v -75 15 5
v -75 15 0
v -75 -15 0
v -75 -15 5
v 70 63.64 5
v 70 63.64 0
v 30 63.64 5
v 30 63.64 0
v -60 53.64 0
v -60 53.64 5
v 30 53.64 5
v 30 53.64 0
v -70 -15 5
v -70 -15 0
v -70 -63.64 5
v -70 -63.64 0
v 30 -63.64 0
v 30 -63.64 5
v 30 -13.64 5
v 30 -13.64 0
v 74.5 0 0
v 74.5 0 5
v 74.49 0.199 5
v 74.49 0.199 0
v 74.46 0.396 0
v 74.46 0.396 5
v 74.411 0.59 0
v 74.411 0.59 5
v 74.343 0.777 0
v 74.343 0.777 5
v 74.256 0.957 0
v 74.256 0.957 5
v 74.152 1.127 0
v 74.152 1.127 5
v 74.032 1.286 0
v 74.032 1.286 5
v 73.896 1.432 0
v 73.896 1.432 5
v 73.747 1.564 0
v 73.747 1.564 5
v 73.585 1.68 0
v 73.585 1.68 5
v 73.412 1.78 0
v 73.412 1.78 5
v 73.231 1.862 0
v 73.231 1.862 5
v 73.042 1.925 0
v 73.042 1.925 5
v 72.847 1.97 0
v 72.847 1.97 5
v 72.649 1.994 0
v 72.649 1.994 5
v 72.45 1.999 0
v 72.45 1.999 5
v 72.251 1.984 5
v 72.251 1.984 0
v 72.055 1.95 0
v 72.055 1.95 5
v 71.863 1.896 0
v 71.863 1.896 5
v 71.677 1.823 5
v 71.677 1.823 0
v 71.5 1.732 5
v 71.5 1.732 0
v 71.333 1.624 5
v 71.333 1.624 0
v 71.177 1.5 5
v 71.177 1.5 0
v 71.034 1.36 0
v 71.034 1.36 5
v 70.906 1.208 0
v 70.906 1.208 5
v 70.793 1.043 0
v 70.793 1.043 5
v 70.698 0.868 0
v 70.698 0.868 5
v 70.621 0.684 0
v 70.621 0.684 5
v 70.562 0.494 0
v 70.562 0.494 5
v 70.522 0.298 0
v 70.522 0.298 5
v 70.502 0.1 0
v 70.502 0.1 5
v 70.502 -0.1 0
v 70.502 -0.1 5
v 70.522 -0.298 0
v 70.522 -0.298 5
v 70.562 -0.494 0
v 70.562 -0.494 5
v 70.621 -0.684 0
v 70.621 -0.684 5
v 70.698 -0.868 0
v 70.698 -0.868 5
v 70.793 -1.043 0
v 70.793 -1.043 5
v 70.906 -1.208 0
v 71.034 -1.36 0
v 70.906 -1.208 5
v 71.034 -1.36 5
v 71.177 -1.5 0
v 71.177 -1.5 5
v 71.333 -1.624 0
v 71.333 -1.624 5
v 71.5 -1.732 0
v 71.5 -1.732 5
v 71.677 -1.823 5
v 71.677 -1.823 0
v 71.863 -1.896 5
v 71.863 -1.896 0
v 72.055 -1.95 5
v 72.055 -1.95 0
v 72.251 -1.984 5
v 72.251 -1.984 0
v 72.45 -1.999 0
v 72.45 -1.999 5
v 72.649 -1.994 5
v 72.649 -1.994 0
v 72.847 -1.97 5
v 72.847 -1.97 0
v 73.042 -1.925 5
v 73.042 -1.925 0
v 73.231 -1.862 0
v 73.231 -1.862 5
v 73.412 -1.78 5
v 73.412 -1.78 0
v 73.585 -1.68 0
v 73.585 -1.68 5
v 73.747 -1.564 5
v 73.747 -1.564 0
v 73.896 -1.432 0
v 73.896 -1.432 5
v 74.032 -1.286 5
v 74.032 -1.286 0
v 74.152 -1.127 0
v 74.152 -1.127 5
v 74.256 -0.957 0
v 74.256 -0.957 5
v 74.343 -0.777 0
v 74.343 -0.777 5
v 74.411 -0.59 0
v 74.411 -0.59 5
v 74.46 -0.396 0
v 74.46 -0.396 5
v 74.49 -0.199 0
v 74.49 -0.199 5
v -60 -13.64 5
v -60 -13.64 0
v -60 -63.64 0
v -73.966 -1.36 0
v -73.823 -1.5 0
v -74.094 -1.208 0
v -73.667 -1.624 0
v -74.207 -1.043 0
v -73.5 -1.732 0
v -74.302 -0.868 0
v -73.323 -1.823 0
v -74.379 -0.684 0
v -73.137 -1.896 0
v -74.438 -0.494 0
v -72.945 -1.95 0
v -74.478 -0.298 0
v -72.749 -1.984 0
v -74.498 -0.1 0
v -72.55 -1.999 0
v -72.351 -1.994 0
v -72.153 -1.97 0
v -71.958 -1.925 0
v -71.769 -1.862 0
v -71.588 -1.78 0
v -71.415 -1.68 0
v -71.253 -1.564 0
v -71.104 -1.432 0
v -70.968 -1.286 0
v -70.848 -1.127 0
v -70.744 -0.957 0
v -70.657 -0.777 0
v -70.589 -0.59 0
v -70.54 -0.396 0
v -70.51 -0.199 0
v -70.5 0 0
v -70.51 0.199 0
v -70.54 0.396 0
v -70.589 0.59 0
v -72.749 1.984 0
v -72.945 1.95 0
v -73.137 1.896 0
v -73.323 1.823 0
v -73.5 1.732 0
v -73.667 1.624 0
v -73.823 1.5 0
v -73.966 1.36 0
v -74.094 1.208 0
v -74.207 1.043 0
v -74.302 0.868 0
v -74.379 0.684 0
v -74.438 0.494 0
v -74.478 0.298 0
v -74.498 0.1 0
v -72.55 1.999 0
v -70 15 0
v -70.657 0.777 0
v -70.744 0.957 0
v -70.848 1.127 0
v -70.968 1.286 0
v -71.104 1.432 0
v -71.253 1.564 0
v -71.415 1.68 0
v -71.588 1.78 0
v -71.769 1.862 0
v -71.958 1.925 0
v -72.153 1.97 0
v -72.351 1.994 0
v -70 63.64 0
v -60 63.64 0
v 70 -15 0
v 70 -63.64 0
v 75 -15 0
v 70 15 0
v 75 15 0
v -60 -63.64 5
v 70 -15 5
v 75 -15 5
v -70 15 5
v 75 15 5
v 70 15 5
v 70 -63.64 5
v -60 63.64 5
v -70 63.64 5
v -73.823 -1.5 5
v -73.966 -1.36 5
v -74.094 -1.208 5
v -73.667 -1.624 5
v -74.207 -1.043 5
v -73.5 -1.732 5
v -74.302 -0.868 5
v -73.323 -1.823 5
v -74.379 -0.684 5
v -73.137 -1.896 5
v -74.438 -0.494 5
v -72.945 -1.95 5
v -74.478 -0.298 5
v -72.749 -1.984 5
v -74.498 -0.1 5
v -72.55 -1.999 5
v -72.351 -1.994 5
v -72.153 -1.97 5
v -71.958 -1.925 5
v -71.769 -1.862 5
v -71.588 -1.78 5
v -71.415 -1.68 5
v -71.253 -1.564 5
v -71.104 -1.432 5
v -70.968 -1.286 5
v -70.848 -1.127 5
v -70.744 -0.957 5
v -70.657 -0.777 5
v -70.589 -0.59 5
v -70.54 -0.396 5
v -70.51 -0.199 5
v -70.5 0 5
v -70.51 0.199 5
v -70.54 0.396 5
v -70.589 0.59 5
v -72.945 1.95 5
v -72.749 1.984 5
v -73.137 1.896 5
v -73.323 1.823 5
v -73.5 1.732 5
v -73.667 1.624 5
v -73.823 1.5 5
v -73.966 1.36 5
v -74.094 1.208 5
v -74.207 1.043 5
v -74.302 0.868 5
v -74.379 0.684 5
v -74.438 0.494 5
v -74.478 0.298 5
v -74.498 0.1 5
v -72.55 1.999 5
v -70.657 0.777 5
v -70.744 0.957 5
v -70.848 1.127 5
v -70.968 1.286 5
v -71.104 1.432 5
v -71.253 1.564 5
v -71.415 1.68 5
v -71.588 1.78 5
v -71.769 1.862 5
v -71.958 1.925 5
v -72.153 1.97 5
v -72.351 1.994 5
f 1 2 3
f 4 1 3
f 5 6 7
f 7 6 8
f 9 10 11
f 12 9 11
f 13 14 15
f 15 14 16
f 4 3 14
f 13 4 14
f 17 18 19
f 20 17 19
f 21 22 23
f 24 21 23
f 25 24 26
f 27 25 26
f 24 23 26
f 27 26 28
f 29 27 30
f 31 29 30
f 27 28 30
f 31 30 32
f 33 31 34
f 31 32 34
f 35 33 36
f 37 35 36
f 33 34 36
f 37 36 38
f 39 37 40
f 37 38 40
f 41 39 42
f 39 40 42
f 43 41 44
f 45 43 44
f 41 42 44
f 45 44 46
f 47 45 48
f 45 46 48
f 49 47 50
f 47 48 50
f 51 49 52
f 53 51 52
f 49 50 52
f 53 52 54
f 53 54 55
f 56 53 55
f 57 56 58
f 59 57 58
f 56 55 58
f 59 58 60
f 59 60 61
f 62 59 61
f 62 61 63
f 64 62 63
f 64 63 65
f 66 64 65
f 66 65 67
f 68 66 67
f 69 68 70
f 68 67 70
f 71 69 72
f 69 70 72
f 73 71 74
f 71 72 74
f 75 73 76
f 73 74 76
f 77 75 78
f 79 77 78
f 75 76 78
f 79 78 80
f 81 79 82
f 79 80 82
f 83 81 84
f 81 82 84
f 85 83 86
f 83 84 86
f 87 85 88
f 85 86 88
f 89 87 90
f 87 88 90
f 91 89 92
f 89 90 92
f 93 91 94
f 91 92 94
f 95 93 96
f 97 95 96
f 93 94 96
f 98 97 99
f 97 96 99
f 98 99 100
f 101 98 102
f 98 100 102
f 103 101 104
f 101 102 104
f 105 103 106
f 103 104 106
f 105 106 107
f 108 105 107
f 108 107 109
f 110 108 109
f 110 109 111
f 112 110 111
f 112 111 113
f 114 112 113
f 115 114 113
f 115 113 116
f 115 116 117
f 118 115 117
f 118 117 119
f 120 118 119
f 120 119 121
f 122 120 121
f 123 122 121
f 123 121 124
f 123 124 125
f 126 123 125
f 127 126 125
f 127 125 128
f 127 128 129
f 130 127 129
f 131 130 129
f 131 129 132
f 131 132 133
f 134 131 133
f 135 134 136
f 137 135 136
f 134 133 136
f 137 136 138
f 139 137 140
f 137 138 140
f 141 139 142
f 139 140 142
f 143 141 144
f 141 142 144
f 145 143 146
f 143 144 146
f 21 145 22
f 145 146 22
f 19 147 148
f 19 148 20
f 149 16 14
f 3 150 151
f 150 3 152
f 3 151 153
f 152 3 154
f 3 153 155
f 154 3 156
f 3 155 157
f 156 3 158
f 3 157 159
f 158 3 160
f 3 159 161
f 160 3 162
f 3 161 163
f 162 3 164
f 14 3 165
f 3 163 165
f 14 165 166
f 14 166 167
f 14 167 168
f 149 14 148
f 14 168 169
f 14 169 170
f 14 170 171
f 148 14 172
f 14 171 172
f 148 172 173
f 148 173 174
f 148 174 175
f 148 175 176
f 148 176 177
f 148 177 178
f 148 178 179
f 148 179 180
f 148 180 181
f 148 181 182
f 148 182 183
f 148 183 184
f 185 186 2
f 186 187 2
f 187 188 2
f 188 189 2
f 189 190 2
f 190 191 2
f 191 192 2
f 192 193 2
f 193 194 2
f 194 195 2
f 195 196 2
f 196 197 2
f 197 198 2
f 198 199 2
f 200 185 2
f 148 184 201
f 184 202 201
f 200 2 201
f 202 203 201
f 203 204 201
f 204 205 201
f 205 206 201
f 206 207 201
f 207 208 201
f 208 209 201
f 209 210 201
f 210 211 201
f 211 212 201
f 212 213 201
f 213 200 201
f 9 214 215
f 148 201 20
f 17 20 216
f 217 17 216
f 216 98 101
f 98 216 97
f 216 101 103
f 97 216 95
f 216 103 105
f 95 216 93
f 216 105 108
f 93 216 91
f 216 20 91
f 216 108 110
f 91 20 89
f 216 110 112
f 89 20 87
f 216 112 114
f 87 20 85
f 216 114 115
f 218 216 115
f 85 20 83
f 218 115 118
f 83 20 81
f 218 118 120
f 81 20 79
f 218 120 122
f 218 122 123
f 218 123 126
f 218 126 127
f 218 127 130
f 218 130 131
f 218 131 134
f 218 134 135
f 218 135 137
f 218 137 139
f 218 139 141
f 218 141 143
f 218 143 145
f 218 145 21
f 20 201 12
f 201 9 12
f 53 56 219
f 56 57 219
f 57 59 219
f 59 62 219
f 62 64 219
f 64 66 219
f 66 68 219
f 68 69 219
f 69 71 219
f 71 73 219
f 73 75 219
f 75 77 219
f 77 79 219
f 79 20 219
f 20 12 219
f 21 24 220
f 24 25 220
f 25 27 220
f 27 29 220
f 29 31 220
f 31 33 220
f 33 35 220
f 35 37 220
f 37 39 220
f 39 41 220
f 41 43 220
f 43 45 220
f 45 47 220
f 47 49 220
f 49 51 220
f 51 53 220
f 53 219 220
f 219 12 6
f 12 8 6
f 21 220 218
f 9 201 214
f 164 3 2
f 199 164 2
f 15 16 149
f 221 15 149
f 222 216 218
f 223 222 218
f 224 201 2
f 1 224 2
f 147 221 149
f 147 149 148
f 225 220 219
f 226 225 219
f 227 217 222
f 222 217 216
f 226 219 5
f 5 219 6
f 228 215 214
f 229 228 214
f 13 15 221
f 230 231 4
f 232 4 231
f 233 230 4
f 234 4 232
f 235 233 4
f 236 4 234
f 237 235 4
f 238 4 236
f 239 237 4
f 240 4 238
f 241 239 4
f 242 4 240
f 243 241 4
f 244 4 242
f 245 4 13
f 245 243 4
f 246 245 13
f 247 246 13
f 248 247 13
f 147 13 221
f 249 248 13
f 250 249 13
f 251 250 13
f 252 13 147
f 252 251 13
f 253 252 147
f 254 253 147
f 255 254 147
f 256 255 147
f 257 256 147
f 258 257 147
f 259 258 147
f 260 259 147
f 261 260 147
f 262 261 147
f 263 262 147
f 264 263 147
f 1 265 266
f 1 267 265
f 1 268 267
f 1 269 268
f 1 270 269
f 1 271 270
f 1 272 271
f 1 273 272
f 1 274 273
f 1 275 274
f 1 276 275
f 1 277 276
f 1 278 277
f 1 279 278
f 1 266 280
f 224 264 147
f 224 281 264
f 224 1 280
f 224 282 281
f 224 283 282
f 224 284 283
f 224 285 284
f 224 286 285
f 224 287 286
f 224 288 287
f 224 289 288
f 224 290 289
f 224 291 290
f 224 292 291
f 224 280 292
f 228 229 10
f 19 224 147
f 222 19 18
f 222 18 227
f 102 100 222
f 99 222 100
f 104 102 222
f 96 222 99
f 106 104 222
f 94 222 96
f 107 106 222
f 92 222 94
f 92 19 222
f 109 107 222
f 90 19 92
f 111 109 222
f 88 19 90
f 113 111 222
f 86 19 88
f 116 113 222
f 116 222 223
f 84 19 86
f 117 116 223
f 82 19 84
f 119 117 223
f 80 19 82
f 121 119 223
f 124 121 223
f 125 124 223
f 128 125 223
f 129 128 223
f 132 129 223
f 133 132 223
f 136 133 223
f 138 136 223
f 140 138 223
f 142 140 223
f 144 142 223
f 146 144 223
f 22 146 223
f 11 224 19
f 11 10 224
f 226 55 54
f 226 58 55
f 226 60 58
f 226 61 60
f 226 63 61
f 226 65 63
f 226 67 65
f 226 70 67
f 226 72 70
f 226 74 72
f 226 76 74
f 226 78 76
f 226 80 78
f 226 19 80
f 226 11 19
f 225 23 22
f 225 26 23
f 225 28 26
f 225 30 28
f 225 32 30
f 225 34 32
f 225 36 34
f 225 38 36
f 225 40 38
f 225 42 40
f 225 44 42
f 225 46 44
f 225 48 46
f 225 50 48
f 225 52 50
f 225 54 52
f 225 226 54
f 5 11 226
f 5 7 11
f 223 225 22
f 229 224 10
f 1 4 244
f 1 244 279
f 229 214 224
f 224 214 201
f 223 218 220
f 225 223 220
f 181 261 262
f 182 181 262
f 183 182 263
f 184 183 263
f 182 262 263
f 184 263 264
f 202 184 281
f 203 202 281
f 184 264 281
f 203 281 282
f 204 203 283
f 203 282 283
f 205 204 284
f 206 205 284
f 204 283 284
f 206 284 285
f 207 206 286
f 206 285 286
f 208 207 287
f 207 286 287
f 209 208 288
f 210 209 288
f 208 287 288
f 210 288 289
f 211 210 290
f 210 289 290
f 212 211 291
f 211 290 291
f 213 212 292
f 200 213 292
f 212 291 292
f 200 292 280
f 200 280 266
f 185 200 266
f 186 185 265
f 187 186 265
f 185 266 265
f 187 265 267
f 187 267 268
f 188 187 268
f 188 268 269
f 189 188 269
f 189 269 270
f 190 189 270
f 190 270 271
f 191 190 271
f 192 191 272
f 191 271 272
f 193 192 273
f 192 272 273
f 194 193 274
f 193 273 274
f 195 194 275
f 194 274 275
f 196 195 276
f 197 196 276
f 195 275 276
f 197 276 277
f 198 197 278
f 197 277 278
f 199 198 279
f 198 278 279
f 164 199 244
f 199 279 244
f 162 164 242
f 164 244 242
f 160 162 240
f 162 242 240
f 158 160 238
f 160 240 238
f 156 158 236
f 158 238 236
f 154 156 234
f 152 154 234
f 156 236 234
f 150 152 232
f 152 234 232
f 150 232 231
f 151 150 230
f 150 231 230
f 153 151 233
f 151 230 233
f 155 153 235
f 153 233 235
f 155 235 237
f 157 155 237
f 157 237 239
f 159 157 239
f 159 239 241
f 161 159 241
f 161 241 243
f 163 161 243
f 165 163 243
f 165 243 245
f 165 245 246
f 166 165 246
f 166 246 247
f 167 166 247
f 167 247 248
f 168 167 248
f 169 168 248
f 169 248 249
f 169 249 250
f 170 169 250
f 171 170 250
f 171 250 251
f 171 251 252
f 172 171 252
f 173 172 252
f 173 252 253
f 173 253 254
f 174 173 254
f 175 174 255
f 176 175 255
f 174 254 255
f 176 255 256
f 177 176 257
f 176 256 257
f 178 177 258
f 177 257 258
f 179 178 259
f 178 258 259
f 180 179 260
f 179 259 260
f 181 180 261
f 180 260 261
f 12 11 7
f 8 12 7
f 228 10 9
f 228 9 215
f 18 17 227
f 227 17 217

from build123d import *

# Parameters (mm, degrees)
BOSS_EXTRUDE1_DEPTH = 5
SKETCH2_R           = 2
CUT_EXTRUDE1_DEPTH  = 5
SKETCH3_W           = 90
SKETCH3_H           = 10
SKETCH3_H_2         = 50
CUT_EXTRUDE2_DEPTH  = 5


with BuildPart() as part:
    # Sketch1 → Boss-Extrude1 (new body)
    with BuildSketch(Plane.XY):
        Polygon((-70, -15), (-70, -63.64), (70, -63.64), (70, -15), (75, -15), (75, 15), (70, 15), (70, 63.64), (-70, 63.64), (-70, 15), (-75, 15), (-75, -15), align=None)
    extrude(amount=BOSS_EXTRUDE1_DEPTH)

    # Sketch2 → Cut-Extrude1 (cut)
    with BuildSketch(Plane.XY.offset(5)):
        with Locations((-72.5, 0)):
            Circle(SKETCH2_R)
        with Locations((72.5, 0)):
            Circle(SKETCH2_R)
    extrude(amount=-CUT_EXTRUDE1_DEPTH, mode=Mode.SUBTRACT)

    # Sketch3 → Cut-Extrude2 (cut)
    with BuildSketch(Plane.XY.offset(5)):
        with Locations((-15, 58.64)):
            Rectangle(SKETCH3_W, SKETCH3_H)
        with Locations((-15, -38.64)):
            Rectangle(SKETCH3_W, SKETCH3_H_2)
    extrude(amount=-CUT_EXTRUDE2_DEPTH, mode=Mode.SUBTRACT)


solid = part.part
